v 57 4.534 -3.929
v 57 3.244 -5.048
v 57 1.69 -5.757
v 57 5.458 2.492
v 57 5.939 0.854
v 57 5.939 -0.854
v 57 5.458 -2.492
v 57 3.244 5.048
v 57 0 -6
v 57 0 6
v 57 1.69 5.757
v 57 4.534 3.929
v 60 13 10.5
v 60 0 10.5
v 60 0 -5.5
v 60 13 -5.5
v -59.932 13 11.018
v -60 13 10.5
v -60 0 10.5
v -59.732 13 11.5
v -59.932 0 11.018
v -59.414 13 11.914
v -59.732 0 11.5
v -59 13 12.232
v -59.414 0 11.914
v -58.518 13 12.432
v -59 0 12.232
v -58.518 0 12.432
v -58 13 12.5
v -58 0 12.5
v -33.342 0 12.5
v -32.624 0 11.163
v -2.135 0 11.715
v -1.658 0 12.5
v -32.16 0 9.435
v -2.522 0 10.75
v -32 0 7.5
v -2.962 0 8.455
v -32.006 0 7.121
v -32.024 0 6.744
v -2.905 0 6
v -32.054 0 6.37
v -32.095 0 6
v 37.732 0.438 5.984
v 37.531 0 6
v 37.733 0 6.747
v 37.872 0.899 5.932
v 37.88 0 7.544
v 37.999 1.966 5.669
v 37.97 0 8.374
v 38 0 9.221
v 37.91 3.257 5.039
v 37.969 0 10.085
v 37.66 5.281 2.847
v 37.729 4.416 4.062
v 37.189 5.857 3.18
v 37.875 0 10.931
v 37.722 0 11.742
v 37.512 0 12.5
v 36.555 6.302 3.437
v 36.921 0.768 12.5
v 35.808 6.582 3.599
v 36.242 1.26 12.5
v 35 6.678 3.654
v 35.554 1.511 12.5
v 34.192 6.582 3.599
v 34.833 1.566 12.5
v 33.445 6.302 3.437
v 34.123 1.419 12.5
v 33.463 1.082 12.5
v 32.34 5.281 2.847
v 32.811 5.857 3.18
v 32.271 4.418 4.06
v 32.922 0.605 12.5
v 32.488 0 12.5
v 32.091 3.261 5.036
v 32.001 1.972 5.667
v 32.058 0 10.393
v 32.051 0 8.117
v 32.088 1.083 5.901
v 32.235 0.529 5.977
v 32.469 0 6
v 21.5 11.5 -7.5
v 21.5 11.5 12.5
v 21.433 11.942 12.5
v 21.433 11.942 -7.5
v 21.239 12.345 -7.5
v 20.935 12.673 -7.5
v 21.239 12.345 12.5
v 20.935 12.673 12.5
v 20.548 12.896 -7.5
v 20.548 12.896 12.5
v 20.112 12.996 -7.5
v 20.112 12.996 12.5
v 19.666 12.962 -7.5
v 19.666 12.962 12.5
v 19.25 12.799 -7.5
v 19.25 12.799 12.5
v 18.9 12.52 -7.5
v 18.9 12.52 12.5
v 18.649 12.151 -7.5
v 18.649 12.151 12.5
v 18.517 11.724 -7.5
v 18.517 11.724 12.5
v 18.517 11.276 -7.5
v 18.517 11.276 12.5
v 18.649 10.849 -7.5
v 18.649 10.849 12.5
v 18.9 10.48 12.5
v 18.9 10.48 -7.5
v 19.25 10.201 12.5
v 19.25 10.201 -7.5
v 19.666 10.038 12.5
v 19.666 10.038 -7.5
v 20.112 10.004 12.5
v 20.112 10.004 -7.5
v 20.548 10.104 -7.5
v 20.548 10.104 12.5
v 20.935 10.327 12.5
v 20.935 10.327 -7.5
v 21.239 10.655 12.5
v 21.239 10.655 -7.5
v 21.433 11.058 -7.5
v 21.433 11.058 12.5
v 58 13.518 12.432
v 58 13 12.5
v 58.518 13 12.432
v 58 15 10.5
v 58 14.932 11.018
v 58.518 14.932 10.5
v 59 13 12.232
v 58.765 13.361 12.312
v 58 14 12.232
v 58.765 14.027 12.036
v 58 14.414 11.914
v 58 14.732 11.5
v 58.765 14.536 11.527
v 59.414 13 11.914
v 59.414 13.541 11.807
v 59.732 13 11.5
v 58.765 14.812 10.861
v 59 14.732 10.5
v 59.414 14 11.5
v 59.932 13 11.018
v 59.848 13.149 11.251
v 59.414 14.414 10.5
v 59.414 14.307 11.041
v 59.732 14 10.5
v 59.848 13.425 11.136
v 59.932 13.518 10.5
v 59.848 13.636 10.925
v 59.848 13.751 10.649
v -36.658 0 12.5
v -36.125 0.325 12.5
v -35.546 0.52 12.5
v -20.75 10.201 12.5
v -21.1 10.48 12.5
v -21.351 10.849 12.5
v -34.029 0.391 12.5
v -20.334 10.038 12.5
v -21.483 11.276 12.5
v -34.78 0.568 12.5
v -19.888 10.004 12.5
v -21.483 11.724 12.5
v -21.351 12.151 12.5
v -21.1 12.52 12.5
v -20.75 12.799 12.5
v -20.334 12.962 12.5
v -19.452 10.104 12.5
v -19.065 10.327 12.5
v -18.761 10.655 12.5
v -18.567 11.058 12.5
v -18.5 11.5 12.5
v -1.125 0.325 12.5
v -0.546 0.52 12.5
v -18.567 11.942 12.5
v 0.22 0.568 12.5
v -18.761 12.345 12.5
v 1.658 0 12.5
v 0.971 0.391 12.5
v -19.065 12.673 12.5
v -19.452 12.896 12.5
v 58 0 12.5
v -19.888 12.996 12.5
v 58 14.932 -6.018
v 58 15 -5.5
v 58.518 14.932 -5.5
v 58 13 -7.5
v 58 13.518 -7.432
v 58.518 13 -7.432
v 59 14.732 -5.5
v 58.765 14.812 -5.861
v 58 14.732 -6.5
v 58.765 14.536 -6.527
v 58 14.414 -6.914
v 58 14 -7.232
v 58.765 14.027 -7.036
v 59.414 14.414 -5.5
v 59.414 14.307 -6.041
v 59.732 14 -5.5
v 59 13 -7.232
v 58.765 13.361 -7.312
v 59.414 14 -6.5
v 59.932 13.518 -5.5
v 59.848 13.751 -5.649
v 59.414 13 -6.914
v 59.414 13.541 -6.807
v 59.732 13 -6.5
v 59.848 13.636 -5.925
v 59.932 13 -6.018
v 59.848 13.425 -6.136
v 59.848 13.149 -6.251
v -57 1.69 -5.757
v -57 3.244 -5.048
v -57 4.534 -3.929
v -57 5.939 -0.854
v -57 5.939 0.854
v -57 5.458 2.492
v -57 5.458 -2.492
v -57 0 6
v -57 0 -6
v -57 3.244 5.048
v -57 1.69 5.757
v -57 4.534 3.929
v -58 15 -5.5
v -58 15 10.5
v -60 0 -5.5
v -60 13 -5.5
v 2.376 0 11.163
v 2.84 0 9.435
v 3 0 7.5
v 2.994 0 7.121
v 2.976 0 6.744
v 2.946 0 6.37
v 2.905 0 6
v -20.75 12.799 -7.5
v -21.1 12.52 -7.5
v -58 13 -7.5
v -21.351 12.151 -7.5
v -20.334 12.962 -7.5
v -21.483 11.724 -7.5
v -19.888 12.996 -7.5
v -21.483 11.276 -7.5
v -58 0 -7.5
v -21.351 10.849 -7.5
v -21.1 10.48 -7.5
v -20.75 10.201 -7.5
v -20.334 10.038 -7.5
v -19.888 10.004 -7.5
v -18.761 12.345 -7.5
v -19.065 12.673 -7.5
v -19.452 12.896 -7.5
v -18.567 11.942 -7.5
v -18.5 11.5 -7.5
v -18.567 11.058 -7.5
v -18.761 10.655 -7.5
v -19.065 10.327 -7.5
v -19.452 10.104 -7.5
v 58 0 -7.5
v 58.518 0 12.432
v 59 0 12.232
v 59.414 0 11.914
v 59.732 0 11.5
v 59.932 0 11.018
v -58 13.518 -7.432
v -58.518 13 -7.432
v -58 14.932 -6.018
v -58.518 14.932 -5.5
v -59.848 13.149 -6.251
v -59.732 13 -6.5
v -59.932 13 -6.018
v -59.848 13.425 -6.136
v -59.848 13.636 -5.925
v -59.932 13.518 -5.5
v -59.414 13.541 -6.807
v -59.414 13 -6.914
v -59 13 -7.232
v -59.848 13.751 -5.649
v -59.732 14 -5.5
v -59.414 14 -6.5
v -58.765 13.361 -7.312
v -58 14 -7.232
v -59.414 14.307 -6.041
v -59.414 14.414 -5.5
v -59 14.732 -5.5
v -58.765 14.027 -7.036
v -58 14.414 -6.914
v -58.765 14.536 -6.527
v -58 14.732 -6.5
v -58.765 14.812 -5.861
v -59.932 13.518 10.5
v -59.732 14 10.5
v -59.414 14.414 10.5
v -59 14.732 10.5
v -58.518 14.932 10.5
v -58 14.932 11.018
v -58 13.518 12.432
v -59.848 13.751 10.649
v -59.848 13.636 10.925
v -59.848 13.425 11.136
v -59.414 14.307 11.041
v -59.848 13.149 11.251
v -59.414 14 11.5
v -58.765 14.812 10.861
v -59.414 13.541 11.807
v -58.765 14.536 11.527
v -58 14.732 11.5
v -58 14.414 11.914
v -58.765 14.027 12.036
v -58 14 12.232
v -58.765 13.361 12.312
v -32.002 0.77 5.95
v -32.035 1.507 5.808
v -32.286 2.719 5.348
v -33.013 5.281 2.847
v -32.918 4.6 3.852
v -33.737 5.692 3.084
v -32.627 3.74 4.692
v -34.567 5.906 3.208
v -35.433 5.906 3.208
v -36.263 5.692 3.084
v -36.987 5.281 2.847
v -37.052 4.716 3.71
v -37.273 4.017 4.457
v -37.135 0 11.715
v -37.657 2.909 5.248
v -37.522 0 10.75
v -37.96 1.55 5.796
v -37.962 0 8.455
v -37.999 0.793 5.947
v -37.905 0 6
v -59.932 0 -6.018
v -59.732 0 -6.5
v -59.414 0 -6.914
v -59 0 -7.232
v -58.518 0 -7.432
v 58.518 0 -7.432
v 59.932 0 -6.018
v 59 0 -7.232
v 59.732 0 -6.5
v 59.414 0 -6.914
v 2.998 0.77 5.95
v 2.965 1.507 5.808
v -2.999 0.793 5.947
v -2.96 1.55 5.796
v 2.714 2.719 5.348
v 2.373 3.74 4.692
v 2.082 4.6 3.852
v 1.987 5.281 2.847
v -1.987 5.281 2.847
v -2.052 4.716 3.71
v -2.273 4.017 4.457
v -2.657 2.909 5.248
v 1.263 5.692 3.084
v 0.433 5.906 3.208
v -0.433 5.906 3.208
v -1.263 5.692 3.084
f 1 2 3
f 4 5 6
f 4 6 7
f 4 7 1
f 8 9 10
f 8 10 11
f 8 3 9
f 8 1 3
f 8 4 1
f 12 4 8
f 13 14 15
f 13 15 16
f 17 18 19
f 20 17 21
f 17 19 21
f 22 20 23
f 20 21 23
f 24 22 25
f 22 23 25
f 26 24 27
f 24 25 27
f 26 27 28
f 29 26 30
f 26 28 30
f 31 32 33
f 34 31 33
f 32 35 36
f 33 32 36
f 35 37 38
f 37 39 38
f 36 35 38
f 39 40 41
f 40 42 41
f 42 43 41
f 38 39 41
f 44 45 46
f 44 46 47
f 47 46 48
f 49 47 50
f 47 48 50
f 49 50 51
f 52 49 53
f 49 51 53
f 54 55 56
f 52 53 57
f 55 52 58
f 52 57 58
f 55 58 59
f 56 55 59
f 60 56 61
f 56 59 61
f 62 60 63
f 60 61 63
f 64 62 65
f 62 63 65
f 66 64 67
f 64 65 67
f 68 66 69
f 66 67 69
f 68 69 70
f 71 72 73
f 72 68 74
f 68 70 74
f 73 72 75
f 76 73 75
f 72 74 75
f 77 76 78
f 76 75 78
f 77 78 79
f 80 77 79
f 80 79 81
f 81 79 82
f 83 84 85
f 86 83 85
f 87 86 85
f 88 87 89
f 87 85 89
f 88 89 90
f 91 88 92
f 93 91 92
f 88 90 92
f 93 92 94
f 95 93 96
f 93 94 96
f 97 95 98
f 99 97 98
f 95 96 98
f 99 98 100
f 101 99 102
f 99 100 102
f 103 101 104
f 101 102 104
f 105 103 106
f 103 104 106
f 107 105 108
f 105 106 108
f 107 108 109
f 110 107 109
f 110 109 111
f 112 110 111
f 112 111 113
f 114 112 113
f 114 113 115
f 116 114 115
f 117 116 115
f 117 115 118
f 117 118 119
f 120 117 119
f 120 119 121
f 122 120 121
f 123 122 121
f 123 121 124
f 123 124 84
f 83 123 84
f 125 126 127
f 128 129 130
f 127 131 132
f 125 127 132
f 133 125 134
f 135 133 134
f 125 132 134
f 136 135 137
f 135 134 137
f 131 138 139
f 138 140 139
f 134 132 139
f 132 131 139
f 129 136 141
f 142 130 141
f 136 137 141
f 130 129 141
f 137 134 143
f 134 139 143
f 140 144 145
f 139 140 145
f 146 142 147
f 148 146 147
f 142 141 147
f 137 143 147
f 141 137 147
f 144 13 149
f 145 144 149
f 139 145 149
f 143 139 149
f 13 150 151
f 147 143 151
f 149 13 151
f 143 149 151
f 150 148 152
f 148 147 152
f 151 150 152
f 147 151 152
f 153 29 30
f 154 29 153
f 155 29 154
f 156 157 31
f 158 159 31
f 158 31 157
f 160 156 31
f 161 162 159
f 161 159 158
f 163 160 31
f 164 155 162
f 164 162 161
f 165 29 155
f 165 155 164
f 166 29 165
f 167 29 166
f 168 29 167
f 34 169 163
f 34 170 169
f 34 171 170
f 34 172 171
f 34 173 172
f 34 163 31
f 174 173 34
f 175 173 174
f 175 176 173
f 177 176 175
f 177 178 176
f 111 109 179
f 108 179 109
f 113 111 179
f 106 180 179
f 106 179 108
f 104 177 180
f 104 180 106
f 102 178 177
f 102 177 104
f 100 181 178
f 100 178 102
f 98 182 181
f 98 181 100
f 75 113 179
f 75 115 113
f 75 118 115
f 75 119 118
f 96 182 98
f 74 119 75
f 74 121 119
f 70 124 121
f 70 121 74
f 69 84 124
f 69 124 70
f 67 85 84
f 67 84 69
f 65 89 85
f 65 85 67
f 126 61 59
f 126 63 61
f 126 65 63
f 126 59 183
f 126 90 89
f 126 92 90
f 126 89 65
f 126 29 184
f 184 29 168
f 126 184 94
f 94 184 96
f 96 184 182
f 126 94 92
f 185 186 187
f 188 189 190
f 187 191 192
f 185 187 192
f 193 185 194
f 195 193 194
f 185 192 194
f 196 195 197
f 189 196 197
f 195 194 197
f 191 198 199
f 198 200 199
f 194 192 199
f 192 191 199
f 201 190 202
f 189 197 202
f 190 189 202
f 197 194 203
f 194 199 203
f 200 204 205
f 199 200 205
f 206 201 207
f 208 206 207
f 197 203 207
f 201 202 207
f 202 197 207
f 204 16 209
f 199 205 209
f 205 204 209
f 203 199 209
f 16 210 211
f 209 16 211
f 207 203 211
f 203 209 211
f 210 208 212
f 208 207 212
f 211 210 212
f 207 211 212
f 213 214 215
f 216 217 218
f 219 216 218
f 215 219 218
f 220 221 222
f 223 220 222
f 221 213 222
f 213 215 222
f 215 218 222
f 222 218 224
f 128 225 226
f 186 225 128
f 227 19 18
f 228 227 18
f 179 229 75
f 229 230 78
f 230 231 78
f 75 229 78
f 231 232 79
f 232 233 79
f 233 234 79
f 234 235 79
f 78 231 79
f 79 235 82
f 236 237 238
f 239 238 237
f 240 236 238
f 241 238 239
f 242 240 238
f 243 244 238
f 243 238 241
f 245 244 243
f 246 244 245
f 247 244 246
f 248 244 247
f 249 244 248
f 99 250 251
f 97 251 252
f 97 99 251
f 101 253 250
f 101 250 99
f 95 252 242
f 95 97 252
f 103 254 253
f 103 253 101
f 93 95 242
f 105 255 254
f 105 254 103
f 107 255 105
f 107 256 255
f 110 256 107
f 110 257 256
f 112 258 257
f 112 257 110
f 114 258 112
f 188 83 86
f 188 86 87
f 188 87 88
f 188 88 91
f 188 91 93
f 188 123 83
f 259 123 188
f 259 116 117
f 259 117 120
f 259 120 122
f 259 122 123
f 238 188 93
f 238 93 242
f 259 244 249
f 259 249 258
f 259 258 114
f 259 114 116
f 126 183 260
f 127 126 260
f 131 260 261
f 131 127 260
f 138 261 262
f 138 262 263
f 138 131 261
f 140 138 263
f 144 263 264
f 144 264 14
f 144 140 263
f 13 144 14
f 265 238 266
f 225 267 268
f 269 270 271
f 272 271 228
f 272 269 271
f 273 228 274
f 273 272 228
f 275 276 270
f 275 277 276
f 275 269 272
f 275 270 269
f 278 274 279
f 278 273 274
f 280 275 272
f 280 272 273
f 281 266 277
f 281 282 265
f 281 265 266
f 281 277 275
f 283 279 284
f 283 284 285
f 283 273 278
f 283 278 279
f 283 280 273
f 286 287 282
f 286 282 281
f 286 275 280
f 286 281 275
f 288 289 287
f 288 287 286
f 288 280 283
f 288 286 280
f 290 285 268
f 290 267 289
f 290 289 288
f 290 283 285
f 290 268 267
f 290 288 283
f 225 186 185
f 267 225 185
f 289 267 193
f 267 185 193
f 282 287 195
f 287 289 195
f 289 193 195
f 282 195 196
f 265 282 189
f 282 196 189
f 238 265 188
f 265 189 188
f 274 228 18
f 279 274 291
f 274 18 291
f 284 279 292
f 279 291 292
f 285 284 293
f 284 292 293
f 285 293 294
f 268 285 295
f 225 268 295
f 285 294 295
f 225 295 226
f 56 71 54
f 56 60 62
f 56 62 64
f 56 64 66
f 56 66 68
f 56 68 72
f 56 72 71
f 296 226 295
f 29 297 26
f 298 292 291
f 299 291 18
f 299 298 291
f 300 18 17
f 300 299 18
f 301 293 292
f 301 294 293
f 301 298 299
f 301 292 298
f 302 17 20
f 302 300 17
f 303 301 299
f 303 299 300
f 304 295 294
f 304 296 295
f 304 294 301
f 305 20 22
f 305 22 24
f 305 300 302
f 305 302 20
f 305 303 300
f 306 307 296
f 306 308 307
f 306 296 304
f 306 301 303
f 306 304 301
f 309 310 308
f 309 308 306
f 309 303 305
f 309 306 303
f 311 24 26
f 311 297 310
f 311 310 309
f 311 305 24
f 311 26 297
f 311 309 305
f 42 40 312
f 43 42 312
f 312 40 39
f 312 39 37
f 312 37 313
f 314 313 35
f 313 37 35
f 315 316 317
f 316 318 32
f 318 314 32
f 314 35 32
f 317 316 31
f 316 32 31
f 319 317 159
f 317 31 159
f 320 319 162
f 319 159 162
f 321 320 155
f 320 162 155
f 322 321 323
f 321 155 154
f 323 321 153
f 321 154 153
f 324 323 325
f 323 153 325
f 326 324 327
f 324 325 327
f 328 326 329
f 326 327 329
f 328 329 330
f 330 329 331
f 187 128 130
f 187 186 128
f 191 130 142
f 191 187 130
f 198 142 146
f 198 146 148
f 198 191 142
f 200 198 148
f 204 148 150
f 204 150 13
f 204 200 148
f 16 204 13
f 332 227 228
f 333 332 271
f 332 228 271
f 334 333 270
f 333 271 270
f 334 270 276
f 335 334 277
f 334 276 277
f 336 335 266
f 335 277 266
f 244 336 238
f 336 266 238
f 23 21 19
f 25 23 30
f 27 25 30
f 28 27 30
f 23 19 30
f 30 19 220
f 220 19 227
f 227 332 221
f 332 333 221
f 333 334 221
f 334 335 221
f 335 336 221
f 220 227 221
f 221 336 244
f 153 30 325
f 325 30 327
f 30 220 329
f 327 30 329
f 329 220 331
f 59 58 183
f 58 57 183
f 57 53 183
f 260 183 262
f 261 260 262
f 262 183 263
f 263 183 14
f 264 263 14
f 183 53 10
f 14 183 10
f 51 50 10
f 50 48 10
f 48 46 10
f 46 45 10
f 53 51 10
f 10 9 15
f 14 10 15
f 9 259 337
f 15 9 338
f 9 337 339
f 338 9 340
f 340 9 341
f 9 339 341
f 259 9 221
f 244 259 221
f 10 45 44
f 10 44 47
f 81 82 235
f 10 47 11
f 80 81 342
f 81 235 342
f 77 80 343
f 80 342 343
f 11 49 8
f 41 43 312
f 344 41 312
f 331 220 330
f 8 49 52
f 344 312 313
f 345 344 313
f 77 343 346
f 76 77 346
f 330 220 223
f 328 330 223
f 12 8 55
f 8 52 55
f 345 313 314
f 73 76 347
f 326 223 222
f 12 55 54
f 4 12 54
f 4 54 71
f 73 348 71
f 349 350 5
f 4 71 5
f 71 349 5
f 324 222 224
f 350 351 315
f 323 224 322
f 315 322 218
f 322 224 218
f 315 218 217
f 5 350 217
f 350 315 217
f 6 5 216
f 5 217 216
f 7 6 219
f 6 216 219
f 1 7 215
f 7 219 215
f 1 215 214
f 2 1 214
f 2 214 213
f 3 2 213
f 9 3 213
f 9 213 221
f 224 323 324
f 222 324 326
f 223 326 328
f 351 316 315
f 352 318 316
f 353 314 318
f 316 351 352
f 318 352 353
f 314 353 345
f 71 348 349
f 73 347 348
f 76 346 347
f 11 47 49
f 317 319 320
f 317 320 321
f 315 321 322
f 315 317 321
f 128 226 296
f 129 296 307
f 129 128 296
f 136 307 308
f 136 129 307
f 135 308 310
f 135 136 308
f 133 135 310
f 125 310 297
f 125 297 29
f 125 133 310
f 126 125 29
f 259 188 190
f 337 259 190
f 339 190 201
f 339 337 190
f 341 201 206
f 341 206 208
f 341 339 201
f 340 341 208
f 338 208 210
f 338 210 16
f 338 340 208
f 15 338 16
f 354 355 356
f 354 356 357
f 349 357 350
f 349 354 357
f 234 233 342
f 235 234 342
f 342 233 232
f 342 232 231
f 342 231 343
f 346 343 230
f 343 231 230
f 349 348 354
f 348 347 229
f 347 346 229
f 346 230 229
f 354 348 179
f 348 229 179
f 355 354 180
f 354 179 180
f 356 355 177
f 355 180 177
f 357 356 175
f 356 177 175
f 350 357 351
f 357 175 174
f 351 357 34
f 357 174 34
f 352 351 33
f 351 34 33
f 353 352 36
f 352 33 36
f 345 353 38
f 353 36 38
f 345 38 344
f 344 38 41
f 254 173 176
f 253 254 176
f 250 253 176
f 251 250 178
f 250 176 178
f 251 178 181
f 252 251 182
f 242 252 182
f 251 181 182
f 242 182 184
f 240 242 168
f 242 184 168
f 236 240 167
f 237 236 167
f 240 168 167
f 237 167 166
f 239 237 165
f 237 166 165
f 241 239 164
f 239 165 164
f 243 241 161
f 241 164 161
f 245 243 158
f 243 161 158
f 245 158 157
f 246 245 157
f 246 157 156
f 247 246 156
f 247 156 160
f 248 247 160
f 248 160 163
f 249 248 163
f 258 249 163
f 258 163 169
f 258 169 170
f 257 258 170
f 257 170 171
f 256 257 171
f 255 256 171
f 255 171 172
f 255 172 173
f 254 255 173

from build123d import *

# Parameters (mm, degrees)
SKETCH1_W           = 120
SKETCH1_H           = 15
BOSS_EXTRUDE1_DEPTH = 15
CUT_EXTRUDE4_START  = -3
SKETCH2_R           = 6
CUT_EXTRUDE4_DEPTH  = 114
SKETCH3_W           = 120
SKETCH3_H           = 15
BOSS_EXTRUDE2_DEPTH = 5
SKETCH5_R           = 3
CUT_EXTRUDE5_DEPTH  = 11
SKETCH6_R           = 1.5
CUT_EXTRUDE6_DEPTH  = 66
FILLET2_R           = 2
FILLET3_R           = 2
FILLET4_R           = 2
FILLET5_R           = 2


with BuildPart() as part:
    # Sketch1 → Boss-Extrude1 (new body)
    with BuildSketch(Plane(origin=(0, 0, 0), x_dir=(1, 0, 0), z_dir=(0, 1, 0))):
        Rectangle(SKETCH1_W, SKETCH1_H)
    extrude(amount=BOSS_EXTRUDE1_DEPTH)

    # Sketch2 → Cut-Extrude4 (cut)
    with BuildSketch(Plane.ZY.offset(60).offset(CUT_EXTRUDE4_START)):
        Circle(SKETCH2_R)
    extrude(amount=-CUT_EXTRUDE4_DEPTH, mode=Mode.SUBTRACT)

    # Sketch3 → Boss-Extrude2 (add)
    with BuildSketch(Plane.XY.offset(7.5)):
        with Locations((0, 7.5)):
            Rectangle(SKETCH3_W, SKETCH3_H)
    extrude(amount=BOSS_EXTRUDE2_DEPTH)

    # Sketch5 → Cut-Extrude5 (cut)
    with BuildSketch(Plane(origin=(0, -5.412658774, 9.375), x_dir=(1, 0, 0), z_dir=(0, -0.499999999999998, 0.8660254037844398))):
        with Locations((-35, 3.75)):
            Circle(SKETCH5_R)
        with Locations((0, 3.75)):
            Circle(SKETCH5_R)
        with Locations((35, 4.610408675)):
            Circle(SKETCH5_R)
    extrude(amount=-CUT_EXTRUDE5_DEPTH, mode=Mode.SUBTRACT)

    # Sketch6 → Cut-Extrude6 (cut, through all)
    with BuildSketch(Plane.XY.offset(12.5)):
        with Locations((-20, 11.5)):
            Circle(SKETCH6_R)
        with Locations((20, 11.5)):
            Circle(SKETCH6_R)
    extrude(amount=-CUT_EXTRUDE6_DEPTH, mode=Mode.SUBTRACT)

    # Fillet2
    fillet2_edges = [part.edges().sort_by_distance(p)[0] for p in [
        (0, 15, -7.5),
    ]]
    fillet(fillet2_edges, radius=FILLET2_R - 0.0001)  # a hair under: the kernel refuses the full size

    # Fillet3
    fillet3_edges = [part.edges().sort_by_distance(p)[0] for p in [
        (0, 15, 12.5),
    ]]
    fillet(fillet3_edges, radius=FILLET3_R - 0.0001)  # a hair under: the kernel refuses the full size

    # Fillet4
    fillet4_edges = [part.edges().sort_by_distance(p)[0] for p in [
        (-60, 6.50005, -7.5),
        (-60, 15, 2.5),
        (-60, 14.414242852, -6.914242852),
        (-60, 6.50005, 12.5),
        (-60, 14.414242852, 11.914242852),
    ]]
    fillet(fillet4_edges, radius=FILLET4_R - 0.0001)  # a hair under: the kernel refuses the full size

    # Fillet5
    fillet5_edges = [part.edges().sort_by_distance(p)[0] for p in [
        (60, 6.50005, 12.5),
        (60, 6.50005, -7.5),
        (60, 14.414242852, -6.914242852),
        (60, 15, 2.5),
        (60, 14.414242852, 11.914242852),
    ]]
    fillet(fillet5_edges, radius=FILLET5_R - 0.0001)  # a hair under: the kernel refuses the full size


solid = part.part
